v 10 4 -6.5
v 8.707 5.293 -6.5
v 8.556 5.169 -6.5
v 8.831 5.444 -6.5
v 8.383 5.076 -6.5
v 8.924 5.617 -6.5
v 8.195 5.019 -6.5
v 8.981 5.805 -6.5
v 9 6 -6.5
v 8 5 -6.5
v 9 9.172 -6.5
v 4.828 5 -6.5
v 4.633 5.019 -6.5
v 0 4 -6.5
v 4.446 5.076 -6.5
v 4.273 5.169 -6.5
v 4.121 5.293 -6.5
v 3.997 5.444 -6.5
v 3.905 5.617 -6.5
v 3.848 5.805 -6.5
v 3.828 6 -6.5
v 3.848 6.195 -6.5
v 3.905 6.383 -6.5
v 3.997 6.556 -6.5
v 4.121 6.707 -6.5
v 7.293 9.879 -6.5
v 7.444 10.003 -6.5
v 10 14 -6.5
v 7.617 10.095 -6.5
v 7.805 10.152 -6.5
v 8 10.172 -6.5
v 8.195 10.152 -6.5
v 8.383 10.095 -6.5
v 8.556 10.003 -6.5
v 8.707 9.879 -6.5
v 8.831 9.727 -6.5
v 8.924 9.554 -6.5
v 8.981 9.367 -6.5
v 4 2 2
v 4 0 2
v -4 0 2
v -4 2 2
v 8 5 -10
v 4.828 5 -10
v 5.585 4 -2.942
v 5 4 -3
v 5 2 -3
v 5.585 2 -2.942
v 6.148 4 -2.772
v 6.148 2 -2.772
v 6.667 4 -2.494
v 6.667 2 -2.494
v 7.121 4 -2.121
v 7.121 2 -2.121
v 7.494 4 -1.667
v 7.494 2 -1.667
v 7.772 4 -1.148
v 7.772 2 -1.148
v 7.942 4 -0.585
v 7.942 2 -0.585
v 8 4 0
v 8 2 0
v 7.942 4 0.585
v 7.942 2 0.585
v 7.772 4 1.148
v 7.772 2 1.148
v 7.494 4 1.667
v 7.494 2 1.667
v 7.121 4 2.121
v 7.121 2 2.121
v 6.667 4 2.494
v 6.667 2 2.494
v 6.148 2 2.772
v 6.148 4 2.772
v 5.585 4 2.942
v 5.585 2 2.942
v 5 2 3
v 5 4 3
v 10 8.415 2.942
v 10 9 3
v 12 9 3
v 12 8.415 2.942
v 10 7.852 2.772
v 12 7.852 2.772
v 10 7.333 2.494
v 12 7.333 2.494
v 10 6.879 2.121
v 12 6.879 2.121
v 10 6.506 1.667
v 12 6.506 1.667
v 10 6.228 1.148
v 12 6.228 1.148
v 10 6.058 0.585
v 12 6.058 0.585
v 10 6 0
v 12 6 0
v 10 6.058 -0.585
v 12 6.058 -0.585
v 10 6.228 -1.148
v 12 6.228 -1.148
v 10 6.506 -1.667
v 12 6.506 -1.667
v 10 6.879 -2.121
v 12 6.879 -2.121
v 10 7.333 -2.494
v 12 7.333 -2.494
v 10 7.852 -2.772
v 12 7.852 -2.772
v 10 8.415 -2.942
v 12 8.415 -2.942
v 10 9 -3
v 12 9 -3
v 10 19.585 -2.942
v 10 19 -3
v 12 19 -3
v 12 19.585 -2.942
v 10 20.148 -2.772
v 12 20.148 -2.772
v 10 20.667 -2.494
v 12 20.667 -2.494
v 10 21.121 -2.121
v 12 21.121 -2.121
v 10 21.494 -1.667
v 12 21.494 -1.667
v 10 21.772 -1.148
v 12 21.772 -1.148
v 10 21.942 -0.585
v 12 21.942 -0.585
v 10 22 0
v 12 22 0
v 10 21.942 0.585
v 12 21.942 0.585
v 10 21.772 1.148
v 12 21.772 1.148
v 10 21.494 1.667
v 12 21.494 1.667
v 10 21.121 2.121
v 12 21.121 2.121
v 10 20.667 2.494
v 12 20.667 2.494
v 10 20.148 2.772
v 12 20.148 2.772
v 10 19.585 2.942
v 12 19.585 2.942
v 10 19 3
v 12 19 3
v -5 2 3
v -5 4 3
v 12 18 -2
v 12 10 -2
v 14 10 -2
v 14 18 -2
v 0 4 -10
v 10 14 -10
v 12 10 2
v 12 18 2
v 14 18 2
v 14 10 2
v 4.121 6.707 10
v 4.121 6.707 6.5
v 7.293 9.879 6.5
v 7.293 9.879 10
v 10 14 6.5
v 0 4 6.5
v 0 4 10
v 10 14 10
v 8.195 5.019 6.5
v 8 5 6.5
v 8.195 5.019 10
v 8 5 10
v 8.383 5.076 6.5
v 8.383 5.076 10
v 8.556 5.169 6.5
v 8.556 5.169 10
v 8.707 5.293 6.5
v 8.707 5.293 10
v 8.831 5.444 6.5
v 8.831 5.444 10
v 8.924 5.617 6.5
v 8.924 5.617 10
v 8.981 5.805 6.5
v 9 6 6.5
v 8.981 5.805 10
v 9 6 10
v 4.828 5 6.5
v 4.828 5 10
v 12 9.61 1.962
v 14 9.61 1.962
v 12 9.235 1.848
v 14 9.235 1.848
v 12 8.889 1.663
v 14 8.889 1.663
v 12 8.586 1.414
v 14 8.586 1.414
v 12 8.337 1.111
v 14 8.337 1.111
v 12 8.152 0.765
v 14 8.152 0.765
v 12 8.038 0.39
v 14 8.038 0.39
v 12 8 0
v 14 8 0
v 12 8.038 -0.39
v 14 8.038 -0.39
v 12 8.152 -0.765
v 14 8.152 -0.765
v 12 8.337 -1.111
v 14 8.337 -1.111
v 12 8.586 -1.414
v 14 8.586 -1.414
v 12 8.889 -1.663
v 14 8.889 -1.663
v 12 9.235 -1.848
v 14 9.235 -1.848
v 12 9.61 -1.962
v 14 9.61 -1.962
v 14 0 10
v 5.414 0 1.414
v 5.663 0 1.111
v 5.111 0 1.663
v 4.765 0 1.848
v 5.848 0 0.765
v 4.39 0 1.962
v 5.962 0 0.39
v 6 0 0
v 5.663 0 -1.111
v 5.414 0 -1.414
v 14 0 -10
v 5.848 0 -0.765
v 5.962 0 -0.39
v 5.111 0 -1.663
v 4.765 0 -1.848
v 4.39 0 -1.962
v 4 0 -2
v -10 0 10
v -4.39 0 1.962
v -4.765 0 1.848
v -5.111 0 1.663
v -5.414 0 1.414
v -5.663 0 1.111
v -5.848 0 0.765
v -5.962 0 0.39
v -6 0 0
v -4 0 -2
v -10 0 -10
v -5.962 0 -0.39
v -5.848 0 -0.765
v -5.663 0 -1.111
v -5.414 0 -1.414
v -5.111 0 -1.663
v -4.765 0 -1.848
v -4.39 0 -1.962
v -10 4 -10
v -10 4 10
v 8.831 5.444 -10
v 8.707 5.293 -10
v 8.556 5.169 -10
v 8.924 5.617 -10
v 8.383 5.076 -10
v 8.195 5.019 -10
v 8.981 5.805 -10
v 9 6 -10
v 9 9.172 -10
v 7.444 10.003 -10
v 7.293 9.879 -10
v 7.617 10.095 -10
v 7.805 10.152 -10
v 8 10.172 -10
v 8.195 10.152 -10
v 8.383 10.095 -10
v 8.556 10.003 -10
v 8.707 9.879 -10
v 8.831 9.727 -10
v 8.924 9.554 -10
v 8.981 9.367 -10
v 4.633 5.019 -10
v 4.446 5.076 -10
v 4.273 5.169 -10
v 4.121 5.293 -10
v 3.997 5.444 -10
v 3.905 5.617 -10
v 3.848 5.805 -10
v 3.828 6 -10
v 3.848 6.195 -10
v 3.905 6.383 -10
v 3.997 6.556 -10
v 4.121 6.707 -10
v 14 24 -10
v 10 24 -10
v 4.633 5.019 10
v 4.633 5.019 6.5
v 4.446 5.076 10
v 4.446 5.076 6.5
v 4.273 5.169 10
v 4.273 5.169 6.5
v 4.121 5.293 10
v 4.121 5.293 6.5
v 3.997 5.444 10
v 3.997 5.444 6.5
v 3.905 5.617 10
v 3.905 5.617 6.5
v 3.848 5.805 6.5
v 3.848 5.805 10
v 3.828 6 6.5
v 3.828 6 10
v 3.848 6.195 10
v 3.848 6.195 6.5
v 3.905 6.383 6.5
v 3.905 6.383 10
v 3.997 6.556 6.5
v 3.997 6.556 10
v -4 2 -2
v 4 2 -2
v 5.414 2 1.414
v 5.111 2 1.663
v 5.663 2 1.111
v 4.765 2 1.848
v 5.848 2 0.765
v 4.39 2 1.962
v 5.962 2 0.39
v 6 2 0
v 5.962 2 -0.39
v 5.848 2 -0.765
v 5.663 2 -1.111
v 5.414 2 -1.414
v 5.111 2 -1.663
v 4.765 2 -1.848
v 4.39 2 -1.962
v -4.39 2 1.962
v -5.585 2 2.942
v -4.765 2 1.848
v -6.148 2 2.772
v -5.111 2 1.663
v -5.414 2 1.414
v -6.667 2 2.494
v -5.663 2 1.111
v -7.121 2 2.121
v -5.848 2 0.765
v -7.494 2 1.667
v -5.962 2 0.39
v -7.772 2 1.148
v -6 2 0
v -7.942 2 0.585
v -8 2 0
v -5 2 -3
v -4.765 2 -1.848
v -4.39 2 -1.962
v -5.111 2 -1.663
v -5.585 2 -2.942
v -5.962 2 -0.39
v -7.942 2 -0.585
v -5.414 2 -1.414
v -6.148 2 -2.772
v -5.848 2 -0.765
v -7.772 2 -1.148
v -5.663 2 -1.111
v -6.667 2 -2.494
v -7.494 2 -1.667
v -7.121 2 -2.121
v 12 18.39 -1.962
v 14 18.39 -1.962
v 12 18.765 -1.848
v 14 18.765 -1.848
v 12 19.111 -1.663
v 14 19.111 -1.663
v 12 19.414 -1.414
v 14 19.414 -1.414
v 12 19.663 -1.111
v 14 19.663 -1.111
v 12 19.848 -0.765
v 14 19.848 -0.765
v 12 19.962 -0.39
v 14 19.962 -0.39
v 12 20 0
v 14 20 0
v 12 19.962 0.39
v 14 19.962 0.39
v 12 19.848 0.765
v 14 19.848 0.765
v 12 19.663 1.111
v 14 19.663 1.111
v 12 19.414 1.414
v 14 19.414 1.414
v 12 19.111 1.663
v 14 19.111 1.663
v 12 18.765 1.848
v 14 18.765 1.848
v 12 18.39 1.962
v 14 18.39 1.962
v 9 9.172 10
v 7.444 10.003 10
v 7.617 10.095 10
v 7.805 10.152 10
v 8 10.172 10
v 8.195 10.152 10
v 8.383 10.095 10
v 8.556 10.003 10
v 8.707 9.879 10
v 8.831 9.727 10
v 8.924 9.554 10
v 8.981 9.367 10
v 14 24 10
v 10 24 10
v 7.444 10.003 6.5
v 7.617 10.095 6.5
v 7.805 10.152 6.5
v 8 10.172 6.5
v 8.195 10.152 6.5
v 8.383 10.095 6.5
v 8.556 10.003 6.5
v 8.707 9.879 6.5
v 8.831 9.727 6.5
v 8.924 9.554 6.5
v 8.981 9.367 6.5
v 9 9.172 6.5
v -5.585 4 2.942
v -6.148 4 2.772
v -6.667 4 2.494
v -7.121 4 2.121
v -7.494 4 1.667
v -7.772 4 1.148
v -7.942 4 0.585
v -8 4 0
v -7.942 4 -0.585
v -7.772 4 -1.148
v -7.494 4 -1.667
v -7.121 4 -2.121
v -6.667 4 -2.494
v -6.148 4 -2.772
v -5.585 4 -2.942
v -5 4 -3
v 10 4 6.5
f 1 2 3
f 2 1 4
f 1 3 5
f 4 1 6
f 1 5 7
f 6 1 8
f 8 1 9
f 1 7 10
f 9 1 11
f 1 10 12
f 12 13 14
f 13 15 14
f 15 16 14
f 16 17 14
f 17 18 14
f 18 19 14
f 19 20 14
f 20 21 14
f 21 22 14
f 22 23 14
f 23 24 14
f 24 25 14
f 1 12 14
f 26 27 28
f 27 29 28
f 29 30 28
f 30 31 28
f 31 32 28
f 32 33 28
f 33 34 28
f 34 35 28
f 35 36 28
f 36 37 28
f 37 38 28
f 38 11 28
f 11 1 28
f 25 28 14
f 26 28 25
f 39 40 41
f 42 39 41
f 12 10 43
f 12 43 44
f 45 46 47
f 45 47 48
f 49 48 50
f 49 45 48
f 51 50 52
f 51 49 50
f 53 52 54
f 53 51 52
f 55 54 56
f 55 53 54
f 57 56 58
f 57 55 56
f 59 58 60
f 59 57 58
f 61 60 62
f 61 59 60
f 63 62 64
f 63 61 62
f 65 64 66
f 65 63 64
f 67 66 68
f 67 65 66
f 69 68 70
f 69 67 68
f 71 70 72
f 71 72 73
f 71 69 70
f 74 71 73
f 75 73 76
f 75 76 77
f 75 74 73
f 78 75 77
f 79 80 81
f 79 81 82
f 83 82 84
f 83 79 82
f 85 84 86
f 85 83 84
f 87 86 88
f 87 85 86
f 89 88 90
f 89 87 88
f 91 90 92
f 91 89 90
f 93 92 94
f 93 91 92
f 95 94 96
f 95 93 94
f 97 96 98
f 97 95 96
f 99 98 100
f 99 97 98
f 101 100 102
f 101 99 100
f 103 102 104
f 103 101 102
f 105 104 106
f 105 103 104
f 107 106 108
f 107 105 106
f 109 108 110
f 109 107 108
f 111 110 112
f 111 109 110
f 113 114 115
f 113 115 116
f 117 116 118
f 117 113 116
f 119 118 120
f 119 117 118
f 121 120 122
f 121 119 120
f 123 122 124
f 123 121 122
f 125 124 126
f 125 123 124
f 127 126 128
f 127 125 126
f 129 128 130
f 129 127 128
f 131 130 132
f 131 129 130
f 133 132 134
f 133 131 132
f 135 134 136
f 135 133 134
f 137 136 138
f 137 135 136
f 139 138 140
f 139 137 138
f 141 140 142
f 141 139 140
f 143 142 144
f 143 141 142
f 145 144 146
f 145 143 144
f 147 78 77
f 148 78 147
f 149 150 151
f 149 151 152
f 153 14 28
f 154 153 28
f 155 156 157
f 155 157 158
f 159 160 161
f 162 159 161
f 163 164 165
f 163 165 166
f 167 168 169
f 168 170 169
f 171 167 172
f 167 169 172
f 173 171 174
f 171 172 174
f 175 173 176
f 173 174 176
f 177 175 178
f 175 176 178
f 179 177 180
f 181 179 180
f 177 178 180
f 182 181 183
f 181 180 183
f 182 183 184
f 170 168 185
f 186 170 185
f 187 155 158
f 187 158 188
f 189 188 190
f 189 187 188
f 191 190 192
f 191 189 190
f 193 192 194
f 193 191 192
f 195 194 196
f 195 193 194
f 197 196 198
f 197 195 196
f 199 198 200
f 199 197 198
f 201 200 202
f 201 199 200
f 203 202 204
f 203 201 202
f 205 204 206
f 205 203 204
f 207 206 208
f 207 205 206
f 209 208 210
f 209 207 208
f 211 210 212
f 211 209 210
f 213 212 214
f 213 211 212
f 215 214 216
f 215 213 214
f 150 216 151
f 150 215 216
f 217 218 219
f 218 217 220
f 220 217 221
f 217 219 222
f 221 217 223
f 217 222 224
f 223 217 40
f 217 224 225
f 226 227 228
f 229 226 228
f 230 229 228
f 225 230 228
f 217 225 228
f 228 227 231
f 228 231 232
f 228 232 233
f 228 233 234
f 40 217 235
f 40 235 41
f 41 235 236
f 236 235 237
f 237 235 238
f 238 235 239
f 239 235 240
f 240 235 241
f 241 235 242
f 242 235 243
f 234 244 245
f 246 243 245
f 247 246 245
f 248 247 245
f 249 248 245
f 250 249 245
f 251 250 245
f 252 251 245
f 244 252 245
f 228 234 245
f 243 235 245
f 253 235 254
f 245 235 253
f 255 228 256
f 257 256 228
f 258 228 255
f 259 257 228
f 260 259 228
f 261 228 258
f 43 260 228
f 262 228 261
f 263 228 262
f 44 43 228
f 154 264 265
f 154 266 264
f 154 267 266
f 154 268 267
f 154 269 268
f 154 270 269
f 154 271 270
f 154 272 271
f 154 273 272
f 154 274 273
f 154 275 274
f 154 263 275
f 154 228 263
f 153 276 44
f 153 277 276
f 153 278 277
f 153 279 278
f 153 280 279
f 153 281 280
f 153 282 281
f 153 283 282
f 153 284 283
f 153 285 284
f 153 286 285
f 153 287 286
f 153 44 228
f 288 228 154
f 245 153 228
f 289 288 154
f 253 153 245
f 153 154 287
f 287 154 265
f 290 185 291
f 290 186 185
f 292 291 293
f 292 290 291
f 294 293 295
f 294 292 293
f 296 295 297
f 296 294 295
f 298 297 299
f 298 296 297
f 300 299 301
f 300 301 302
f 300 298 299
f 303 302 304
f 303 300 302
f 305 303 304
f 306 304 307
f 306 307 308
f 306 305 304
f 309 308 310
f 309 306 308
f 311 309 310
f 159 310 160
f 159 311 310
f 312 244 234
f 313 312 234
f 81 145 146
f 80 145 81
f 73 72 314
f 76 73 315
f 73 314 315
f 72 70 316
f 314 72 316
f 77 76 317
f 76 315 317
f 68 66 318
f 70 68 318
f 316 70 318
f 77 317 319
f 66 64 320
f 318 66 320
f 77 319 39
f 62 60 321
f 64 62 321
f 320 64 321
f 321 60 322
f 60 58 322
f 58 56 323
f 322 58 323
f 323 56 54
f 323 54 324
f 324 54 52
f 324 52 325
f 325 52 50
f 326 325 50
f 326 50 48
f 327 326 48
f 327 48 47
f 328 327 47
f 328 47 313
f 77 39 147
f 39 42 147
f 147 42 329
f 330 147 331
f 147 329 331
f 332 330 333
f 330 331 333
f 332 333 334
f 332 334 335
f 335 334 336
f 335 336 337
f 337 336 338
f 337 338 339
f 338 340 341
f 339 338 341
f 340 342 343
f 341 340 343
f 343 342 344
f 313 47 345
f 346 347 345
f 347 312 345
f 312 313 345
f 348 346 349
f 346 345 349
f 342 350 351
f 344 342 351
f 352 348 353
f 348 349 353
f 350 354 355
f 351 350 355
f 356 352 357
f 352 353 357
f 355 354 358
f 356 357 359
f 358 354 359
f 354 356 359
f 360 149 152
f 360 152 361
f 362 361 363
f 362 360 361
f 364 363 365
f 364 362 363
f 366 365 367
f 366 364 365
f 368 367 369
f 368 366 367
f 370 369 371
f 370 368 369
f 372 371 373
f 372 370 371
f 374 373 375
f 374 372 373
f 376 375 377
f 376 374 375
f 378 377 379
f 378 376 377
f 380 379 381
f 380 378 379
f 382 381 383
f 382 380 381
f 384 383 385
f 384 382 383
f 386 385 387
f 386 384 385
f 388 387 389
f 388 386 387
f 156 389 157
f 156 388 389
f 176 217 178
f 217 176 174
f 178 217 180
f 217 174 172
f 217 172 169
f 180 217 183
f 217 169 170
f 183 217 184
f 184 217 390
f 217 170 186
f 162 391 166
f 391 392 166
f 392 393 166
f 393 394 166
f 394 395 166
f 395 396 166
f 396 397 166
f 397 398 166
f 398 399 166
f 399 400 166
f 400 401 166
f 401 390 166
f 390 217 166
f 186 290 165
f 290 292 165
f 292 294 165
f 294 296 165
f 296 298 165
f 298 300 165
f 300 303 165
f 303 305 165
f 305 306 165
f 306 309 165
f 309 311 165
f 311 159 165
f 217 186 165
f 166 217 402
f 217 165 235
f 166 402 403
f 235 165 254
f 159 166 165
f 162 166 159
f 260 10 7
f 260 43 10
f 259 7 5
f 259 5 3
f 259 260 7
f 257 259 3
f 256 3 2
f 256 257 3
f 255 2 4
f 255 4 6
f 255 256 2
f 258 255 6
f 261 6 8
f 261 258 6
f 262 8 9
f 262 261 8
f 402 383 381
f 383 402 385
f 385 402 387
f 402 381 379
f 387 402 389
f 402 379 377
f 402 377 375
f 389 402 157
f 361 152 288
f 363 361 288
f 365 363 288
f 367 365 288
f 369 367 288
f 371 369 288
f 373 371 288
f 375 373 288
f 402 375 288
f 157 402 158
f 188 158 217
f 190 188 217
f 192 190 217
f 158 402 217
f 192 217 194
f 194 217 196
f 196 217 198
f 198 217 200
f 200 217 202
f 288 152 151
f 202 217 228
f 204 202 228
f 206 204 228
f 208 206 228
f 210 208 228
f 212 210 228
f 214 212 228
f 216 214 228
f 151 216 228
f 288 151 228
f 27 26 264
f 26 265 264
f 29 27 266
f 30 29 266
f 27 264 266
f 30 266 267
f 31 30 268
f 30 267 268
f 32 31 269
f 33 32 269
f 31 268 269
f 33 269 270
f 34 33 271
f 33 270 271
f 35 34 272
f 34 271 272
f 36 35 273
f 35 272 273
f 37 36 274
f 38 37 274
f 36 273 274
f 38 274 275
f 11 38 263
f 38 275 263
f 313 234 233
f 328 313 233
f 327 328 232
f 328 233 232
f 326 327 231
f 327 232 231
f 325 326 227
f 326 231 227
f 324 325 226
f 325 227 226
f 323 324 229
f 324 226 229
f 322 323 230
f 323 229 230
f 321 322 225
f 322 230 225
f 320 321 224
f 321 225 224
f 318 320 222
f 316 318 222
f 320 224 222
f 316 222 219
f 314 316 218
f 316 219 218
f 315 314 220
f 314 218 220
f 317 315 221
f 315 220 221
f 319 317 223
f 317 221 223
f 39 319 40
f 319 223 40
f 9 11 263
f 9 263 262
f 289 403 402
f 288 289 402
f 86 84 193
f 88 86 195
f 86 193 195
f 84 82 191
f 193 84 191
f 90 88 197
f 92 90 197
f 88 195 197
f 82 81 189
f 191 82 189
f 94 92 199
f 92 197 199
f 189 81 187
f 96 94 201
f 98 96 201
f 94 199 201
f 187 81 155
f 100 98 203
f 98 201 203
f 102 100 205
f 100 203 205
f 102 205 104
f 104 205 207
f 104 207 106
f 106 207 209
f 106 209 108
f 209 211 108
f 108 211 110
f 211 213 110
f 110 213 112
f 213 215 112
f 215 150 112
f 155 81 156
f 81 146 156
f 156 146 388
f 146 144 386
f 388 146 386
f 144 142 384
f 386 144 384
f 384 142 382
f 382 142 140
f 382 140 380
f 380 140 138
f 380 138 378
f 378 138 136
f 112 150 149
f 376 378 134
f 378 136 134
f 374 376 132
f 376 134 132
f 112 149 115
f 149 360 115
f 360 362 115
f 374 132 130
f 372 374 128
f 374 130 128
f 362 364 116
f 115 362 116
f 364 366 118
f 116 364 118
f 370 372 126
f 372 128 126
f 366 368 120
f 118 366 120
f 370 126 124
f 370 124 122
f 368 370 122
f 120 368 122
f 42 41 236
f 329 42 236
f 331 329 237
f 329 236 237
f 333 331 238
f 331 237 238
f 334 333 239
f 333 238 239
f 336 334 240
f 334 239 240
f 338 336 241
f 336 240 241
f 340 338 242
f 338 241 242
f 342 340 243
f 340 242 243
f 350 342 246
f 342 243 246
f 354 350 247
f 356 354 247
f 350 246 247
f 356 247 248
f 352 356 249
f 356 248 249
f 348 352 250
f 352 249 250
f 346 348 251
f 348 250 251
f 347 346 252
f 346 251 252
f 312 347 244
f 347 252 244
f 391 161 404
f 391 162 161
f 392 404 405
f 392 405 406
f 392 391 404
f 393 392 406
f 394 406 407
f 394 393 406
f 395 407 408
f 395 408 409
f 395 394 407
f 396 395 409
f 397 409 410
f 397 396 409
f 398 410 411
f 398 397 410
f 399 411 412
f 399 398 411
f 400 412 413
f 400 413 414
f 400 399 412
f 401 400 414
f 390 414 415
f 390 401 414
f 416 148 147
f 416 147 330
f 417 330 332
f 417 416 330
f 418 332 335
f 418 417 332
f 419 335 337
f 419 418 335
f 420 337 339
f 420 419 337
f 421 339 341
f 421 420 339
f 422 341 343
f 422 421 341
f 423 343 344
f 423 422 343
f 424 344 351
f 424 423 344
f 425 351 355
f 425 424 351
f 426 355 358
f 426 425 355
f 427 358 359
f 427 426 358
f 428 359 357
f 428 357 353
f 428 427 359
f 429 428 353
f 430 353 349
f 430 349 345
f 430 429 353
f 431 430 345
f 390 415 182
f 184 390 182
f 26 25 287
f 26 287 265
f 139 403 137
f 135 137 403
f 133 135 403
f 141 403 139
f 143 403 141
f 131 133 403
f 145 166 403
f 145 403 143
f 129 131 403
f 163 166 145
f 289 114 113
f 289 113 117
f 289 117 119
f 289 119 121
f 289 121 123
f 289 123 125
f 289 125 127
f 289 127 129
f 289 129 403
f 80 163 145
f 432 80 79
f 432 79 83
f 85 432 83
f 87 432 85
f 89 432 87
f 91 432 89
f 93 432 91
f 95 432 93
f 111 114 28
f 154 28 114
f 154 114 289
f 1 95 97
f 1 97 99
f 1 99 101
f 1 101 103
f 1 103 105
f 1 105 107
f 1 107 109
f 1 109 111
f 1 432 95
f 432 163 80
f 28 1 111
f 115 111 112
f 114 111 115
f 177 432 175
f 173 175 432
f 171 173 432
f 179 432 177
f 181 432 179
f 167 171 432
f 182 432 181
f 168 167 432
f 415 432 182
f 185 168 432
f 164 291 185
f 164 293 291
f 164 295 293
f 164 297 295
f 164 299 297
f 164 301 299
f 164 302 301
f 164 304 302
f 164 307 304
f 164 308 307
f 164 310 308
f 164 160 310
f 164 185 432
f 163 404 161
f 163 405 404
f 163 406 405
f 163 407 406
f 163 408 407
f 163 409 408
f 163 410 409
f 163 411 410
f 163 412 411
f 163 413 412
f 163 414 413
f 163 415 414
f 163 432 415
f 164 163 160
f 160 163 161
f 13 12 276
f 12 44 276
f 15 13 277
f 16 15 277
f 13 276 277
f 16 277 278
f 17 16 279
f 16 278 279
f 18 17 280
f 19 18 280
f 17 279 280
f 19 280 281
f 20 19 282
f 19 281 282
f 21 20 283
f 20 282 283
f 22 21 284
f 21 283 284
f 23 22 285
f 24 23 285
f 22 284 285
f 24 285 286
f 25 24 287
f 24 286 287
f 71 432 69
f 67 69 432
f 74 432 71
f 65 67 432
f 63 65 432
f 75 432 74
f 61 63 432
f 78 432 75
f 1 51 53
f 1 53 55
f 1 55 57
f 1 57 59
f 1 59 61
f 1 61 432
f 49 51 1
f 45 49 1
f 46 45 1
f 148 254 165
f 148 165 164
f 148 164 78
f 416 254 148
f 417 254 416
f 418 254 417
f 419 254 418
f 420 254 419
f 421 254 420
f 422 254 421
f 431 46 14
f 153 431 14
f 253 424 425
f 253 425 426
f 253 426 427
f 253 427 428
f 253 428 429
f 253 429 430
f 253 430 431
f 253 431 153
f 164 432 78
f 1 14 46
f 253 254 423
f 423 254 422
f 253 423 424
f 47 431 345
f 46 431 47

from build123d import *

# Parameters (mm, degrees)
SKETCH1_W            = 20
SKETCH1_H            = 20
BOSS_EXTRUDE1_DEPTH  = 4
CUT_EXTRUDE1_DEPTH   = 2
SKETCH4_W            = 20
SKETCH4_H            = 4
BOSS_EXTRUDE2_DEPTH  = 4
SKETCH5_W            = 4
SKETCH5_H            = 20
BOSS_EXTRUDE3_DEPTH  = 20
CUT_EXTRUDE2_DEPTH   = 2
CUT_EXTRUDE3_DEPTH   = 2
EXTRUDE_THIN2_DEPTH  = 3.5
FILLET1_R            = 1
FILLET1_OF_MIRROR3_R = 1


with BuildPart() as part:
    # Sketch1 → Boss-Extrude1 (new body)
    with BuildSketch(Plane(origin=(0, 0, 0), x_dir=(1, 0, 0), z_dir=(0, 1, 0))):
        Rectangle(SKETCH1_W, SKETCH1_H)
        with BuildLine():
            Line((-4, 2), (4, 2))
            ThreePointArc((4, 2), (6, 0), (4, -2))
            Line((4, -2), (-4, -2))
            ThreePointArc((-4, -2), (-6, 0), (-4, 2))
        make_face(mode=Mode.SUBTRACT)
    extrude(amount=BOSS_EXTRUDE1_DEPTH)

    # Sketch3 → Cut-Extrude1 (cut)
    with BuildSketch(Plane(origin=(0, 4, 0), x_dir=(1, 0, 0), z_dir=(0, 1, 0))):
        with BuildLine():
            Line((-5, 3), (5, 3))
            ThreePointArc((5, 3), (8, 0), (5, -3))
            Line((5, -3), (-5, -3))
            ThreePointArc((-5, -3), (-8, 0), (-5, 3))
        make_face()
    extrude(amount=-CUT_EXTRUDE1_DEPTH, mode=Mode.SUBTRACT)

    # Sketch4 → Boss-Extrude2 (add)
    with BuildSketch(Plane(origin=(10, 0, 0), x_dir=(0, 0, -1), z_dir=(1, 0, 0))):
        with Locations((0, 2)):
            Rectangle(SKETCH4_W, SKETCH4_H)
    extrude(amount=BOSS_EXTRUDE2_DEPTH)

    # Sketch5 → Boss-Extrude3 (add)
    with BuildSketch(Plane(origin=(0, 4, 0), x_dir=(1, 0, 0), z_dir=(0, 1, 0))):
        with Locations((12, 0)):
            Rectangle(SKETCH5_W, SKETCH5_H)
    extrude(amount=BOSS_EXTRUDE3_DEPTH)

    # Sketch6 → Cut-Extrude2 (cut)
    with BuildSketch(Plane.ZY.offset(-10)):
        with BuildLine():
            Line((-3, 9), (-3, 19))
            ThreePointArc((-3, 19), (0, 22), (3, 19))
            Line((3, 19), (3, 9))
            ThreePointArc((3, 9), (0, 6), (-3, 9))
        make_face()
    extrude(amount=-CUT_EXTRUDE2_DEPTH, mode=Mode.SUBTRACT)

    # Sketch7 → Cut-Extrude3 (cut)
    with BuildSketch(Plane.ZY.offset(-12)):
        with BuildLine():
            Line((-2, 10), (-2, 18))
            ThreePointArc((-2, 18), (0, 20), (2, 18))
            Line((2, 18), (2, 10))
            ThreePointArc((2, 10), (0, 8), (-2, 10))
        make_face()
    extrude(amount=-CUT_EXTRUDE3_DEPTH, mode=Mode.SUBTRACT)

    # Sketch17 → Extrude-Thin2 (add)
    with BuildSketch(Plane.XY.offset(-6.5)):
        Polygon((10, 4), (0, 4), (10, 14), align=None)
        Polygon((9, 5), (2.414213562, 5), (9, 11.585786438), align=None, mode=Mode.SUBTRACT)
    extrude_thin2 = extrude(amount=-EXTRUDE_THIN2_DEPTH)

    # Fillet1
    fillet1_edges = [part.edges().sort_by_distance(p)[0] for p in [
        (9, 5, -8.25),
        (2.414213562, 5, -8.25),
        (9, 11.585786438, -8.25),
    ]]
    fillet(fillet1_edges, radius=FILLET1_R)

    # Mirror3: Extrude-Thin2 across plane
    add(extrude_thin2.mirror(Plane.XY))

    # Fillet1 of Mirror3
    fillet1_of_mirror3_edges = [part.edges().sort_by_distance(p)[0] for p in [
        (9, 5, 8.25),
        (2.414213562, 5, 8.25),
        (9, 11.585786438, 8.25),
    ]]
    fillet(fillet1_of_mirror3_edges, radius=FILLET1_OF_MIRROR3_R)


solid = part.part
